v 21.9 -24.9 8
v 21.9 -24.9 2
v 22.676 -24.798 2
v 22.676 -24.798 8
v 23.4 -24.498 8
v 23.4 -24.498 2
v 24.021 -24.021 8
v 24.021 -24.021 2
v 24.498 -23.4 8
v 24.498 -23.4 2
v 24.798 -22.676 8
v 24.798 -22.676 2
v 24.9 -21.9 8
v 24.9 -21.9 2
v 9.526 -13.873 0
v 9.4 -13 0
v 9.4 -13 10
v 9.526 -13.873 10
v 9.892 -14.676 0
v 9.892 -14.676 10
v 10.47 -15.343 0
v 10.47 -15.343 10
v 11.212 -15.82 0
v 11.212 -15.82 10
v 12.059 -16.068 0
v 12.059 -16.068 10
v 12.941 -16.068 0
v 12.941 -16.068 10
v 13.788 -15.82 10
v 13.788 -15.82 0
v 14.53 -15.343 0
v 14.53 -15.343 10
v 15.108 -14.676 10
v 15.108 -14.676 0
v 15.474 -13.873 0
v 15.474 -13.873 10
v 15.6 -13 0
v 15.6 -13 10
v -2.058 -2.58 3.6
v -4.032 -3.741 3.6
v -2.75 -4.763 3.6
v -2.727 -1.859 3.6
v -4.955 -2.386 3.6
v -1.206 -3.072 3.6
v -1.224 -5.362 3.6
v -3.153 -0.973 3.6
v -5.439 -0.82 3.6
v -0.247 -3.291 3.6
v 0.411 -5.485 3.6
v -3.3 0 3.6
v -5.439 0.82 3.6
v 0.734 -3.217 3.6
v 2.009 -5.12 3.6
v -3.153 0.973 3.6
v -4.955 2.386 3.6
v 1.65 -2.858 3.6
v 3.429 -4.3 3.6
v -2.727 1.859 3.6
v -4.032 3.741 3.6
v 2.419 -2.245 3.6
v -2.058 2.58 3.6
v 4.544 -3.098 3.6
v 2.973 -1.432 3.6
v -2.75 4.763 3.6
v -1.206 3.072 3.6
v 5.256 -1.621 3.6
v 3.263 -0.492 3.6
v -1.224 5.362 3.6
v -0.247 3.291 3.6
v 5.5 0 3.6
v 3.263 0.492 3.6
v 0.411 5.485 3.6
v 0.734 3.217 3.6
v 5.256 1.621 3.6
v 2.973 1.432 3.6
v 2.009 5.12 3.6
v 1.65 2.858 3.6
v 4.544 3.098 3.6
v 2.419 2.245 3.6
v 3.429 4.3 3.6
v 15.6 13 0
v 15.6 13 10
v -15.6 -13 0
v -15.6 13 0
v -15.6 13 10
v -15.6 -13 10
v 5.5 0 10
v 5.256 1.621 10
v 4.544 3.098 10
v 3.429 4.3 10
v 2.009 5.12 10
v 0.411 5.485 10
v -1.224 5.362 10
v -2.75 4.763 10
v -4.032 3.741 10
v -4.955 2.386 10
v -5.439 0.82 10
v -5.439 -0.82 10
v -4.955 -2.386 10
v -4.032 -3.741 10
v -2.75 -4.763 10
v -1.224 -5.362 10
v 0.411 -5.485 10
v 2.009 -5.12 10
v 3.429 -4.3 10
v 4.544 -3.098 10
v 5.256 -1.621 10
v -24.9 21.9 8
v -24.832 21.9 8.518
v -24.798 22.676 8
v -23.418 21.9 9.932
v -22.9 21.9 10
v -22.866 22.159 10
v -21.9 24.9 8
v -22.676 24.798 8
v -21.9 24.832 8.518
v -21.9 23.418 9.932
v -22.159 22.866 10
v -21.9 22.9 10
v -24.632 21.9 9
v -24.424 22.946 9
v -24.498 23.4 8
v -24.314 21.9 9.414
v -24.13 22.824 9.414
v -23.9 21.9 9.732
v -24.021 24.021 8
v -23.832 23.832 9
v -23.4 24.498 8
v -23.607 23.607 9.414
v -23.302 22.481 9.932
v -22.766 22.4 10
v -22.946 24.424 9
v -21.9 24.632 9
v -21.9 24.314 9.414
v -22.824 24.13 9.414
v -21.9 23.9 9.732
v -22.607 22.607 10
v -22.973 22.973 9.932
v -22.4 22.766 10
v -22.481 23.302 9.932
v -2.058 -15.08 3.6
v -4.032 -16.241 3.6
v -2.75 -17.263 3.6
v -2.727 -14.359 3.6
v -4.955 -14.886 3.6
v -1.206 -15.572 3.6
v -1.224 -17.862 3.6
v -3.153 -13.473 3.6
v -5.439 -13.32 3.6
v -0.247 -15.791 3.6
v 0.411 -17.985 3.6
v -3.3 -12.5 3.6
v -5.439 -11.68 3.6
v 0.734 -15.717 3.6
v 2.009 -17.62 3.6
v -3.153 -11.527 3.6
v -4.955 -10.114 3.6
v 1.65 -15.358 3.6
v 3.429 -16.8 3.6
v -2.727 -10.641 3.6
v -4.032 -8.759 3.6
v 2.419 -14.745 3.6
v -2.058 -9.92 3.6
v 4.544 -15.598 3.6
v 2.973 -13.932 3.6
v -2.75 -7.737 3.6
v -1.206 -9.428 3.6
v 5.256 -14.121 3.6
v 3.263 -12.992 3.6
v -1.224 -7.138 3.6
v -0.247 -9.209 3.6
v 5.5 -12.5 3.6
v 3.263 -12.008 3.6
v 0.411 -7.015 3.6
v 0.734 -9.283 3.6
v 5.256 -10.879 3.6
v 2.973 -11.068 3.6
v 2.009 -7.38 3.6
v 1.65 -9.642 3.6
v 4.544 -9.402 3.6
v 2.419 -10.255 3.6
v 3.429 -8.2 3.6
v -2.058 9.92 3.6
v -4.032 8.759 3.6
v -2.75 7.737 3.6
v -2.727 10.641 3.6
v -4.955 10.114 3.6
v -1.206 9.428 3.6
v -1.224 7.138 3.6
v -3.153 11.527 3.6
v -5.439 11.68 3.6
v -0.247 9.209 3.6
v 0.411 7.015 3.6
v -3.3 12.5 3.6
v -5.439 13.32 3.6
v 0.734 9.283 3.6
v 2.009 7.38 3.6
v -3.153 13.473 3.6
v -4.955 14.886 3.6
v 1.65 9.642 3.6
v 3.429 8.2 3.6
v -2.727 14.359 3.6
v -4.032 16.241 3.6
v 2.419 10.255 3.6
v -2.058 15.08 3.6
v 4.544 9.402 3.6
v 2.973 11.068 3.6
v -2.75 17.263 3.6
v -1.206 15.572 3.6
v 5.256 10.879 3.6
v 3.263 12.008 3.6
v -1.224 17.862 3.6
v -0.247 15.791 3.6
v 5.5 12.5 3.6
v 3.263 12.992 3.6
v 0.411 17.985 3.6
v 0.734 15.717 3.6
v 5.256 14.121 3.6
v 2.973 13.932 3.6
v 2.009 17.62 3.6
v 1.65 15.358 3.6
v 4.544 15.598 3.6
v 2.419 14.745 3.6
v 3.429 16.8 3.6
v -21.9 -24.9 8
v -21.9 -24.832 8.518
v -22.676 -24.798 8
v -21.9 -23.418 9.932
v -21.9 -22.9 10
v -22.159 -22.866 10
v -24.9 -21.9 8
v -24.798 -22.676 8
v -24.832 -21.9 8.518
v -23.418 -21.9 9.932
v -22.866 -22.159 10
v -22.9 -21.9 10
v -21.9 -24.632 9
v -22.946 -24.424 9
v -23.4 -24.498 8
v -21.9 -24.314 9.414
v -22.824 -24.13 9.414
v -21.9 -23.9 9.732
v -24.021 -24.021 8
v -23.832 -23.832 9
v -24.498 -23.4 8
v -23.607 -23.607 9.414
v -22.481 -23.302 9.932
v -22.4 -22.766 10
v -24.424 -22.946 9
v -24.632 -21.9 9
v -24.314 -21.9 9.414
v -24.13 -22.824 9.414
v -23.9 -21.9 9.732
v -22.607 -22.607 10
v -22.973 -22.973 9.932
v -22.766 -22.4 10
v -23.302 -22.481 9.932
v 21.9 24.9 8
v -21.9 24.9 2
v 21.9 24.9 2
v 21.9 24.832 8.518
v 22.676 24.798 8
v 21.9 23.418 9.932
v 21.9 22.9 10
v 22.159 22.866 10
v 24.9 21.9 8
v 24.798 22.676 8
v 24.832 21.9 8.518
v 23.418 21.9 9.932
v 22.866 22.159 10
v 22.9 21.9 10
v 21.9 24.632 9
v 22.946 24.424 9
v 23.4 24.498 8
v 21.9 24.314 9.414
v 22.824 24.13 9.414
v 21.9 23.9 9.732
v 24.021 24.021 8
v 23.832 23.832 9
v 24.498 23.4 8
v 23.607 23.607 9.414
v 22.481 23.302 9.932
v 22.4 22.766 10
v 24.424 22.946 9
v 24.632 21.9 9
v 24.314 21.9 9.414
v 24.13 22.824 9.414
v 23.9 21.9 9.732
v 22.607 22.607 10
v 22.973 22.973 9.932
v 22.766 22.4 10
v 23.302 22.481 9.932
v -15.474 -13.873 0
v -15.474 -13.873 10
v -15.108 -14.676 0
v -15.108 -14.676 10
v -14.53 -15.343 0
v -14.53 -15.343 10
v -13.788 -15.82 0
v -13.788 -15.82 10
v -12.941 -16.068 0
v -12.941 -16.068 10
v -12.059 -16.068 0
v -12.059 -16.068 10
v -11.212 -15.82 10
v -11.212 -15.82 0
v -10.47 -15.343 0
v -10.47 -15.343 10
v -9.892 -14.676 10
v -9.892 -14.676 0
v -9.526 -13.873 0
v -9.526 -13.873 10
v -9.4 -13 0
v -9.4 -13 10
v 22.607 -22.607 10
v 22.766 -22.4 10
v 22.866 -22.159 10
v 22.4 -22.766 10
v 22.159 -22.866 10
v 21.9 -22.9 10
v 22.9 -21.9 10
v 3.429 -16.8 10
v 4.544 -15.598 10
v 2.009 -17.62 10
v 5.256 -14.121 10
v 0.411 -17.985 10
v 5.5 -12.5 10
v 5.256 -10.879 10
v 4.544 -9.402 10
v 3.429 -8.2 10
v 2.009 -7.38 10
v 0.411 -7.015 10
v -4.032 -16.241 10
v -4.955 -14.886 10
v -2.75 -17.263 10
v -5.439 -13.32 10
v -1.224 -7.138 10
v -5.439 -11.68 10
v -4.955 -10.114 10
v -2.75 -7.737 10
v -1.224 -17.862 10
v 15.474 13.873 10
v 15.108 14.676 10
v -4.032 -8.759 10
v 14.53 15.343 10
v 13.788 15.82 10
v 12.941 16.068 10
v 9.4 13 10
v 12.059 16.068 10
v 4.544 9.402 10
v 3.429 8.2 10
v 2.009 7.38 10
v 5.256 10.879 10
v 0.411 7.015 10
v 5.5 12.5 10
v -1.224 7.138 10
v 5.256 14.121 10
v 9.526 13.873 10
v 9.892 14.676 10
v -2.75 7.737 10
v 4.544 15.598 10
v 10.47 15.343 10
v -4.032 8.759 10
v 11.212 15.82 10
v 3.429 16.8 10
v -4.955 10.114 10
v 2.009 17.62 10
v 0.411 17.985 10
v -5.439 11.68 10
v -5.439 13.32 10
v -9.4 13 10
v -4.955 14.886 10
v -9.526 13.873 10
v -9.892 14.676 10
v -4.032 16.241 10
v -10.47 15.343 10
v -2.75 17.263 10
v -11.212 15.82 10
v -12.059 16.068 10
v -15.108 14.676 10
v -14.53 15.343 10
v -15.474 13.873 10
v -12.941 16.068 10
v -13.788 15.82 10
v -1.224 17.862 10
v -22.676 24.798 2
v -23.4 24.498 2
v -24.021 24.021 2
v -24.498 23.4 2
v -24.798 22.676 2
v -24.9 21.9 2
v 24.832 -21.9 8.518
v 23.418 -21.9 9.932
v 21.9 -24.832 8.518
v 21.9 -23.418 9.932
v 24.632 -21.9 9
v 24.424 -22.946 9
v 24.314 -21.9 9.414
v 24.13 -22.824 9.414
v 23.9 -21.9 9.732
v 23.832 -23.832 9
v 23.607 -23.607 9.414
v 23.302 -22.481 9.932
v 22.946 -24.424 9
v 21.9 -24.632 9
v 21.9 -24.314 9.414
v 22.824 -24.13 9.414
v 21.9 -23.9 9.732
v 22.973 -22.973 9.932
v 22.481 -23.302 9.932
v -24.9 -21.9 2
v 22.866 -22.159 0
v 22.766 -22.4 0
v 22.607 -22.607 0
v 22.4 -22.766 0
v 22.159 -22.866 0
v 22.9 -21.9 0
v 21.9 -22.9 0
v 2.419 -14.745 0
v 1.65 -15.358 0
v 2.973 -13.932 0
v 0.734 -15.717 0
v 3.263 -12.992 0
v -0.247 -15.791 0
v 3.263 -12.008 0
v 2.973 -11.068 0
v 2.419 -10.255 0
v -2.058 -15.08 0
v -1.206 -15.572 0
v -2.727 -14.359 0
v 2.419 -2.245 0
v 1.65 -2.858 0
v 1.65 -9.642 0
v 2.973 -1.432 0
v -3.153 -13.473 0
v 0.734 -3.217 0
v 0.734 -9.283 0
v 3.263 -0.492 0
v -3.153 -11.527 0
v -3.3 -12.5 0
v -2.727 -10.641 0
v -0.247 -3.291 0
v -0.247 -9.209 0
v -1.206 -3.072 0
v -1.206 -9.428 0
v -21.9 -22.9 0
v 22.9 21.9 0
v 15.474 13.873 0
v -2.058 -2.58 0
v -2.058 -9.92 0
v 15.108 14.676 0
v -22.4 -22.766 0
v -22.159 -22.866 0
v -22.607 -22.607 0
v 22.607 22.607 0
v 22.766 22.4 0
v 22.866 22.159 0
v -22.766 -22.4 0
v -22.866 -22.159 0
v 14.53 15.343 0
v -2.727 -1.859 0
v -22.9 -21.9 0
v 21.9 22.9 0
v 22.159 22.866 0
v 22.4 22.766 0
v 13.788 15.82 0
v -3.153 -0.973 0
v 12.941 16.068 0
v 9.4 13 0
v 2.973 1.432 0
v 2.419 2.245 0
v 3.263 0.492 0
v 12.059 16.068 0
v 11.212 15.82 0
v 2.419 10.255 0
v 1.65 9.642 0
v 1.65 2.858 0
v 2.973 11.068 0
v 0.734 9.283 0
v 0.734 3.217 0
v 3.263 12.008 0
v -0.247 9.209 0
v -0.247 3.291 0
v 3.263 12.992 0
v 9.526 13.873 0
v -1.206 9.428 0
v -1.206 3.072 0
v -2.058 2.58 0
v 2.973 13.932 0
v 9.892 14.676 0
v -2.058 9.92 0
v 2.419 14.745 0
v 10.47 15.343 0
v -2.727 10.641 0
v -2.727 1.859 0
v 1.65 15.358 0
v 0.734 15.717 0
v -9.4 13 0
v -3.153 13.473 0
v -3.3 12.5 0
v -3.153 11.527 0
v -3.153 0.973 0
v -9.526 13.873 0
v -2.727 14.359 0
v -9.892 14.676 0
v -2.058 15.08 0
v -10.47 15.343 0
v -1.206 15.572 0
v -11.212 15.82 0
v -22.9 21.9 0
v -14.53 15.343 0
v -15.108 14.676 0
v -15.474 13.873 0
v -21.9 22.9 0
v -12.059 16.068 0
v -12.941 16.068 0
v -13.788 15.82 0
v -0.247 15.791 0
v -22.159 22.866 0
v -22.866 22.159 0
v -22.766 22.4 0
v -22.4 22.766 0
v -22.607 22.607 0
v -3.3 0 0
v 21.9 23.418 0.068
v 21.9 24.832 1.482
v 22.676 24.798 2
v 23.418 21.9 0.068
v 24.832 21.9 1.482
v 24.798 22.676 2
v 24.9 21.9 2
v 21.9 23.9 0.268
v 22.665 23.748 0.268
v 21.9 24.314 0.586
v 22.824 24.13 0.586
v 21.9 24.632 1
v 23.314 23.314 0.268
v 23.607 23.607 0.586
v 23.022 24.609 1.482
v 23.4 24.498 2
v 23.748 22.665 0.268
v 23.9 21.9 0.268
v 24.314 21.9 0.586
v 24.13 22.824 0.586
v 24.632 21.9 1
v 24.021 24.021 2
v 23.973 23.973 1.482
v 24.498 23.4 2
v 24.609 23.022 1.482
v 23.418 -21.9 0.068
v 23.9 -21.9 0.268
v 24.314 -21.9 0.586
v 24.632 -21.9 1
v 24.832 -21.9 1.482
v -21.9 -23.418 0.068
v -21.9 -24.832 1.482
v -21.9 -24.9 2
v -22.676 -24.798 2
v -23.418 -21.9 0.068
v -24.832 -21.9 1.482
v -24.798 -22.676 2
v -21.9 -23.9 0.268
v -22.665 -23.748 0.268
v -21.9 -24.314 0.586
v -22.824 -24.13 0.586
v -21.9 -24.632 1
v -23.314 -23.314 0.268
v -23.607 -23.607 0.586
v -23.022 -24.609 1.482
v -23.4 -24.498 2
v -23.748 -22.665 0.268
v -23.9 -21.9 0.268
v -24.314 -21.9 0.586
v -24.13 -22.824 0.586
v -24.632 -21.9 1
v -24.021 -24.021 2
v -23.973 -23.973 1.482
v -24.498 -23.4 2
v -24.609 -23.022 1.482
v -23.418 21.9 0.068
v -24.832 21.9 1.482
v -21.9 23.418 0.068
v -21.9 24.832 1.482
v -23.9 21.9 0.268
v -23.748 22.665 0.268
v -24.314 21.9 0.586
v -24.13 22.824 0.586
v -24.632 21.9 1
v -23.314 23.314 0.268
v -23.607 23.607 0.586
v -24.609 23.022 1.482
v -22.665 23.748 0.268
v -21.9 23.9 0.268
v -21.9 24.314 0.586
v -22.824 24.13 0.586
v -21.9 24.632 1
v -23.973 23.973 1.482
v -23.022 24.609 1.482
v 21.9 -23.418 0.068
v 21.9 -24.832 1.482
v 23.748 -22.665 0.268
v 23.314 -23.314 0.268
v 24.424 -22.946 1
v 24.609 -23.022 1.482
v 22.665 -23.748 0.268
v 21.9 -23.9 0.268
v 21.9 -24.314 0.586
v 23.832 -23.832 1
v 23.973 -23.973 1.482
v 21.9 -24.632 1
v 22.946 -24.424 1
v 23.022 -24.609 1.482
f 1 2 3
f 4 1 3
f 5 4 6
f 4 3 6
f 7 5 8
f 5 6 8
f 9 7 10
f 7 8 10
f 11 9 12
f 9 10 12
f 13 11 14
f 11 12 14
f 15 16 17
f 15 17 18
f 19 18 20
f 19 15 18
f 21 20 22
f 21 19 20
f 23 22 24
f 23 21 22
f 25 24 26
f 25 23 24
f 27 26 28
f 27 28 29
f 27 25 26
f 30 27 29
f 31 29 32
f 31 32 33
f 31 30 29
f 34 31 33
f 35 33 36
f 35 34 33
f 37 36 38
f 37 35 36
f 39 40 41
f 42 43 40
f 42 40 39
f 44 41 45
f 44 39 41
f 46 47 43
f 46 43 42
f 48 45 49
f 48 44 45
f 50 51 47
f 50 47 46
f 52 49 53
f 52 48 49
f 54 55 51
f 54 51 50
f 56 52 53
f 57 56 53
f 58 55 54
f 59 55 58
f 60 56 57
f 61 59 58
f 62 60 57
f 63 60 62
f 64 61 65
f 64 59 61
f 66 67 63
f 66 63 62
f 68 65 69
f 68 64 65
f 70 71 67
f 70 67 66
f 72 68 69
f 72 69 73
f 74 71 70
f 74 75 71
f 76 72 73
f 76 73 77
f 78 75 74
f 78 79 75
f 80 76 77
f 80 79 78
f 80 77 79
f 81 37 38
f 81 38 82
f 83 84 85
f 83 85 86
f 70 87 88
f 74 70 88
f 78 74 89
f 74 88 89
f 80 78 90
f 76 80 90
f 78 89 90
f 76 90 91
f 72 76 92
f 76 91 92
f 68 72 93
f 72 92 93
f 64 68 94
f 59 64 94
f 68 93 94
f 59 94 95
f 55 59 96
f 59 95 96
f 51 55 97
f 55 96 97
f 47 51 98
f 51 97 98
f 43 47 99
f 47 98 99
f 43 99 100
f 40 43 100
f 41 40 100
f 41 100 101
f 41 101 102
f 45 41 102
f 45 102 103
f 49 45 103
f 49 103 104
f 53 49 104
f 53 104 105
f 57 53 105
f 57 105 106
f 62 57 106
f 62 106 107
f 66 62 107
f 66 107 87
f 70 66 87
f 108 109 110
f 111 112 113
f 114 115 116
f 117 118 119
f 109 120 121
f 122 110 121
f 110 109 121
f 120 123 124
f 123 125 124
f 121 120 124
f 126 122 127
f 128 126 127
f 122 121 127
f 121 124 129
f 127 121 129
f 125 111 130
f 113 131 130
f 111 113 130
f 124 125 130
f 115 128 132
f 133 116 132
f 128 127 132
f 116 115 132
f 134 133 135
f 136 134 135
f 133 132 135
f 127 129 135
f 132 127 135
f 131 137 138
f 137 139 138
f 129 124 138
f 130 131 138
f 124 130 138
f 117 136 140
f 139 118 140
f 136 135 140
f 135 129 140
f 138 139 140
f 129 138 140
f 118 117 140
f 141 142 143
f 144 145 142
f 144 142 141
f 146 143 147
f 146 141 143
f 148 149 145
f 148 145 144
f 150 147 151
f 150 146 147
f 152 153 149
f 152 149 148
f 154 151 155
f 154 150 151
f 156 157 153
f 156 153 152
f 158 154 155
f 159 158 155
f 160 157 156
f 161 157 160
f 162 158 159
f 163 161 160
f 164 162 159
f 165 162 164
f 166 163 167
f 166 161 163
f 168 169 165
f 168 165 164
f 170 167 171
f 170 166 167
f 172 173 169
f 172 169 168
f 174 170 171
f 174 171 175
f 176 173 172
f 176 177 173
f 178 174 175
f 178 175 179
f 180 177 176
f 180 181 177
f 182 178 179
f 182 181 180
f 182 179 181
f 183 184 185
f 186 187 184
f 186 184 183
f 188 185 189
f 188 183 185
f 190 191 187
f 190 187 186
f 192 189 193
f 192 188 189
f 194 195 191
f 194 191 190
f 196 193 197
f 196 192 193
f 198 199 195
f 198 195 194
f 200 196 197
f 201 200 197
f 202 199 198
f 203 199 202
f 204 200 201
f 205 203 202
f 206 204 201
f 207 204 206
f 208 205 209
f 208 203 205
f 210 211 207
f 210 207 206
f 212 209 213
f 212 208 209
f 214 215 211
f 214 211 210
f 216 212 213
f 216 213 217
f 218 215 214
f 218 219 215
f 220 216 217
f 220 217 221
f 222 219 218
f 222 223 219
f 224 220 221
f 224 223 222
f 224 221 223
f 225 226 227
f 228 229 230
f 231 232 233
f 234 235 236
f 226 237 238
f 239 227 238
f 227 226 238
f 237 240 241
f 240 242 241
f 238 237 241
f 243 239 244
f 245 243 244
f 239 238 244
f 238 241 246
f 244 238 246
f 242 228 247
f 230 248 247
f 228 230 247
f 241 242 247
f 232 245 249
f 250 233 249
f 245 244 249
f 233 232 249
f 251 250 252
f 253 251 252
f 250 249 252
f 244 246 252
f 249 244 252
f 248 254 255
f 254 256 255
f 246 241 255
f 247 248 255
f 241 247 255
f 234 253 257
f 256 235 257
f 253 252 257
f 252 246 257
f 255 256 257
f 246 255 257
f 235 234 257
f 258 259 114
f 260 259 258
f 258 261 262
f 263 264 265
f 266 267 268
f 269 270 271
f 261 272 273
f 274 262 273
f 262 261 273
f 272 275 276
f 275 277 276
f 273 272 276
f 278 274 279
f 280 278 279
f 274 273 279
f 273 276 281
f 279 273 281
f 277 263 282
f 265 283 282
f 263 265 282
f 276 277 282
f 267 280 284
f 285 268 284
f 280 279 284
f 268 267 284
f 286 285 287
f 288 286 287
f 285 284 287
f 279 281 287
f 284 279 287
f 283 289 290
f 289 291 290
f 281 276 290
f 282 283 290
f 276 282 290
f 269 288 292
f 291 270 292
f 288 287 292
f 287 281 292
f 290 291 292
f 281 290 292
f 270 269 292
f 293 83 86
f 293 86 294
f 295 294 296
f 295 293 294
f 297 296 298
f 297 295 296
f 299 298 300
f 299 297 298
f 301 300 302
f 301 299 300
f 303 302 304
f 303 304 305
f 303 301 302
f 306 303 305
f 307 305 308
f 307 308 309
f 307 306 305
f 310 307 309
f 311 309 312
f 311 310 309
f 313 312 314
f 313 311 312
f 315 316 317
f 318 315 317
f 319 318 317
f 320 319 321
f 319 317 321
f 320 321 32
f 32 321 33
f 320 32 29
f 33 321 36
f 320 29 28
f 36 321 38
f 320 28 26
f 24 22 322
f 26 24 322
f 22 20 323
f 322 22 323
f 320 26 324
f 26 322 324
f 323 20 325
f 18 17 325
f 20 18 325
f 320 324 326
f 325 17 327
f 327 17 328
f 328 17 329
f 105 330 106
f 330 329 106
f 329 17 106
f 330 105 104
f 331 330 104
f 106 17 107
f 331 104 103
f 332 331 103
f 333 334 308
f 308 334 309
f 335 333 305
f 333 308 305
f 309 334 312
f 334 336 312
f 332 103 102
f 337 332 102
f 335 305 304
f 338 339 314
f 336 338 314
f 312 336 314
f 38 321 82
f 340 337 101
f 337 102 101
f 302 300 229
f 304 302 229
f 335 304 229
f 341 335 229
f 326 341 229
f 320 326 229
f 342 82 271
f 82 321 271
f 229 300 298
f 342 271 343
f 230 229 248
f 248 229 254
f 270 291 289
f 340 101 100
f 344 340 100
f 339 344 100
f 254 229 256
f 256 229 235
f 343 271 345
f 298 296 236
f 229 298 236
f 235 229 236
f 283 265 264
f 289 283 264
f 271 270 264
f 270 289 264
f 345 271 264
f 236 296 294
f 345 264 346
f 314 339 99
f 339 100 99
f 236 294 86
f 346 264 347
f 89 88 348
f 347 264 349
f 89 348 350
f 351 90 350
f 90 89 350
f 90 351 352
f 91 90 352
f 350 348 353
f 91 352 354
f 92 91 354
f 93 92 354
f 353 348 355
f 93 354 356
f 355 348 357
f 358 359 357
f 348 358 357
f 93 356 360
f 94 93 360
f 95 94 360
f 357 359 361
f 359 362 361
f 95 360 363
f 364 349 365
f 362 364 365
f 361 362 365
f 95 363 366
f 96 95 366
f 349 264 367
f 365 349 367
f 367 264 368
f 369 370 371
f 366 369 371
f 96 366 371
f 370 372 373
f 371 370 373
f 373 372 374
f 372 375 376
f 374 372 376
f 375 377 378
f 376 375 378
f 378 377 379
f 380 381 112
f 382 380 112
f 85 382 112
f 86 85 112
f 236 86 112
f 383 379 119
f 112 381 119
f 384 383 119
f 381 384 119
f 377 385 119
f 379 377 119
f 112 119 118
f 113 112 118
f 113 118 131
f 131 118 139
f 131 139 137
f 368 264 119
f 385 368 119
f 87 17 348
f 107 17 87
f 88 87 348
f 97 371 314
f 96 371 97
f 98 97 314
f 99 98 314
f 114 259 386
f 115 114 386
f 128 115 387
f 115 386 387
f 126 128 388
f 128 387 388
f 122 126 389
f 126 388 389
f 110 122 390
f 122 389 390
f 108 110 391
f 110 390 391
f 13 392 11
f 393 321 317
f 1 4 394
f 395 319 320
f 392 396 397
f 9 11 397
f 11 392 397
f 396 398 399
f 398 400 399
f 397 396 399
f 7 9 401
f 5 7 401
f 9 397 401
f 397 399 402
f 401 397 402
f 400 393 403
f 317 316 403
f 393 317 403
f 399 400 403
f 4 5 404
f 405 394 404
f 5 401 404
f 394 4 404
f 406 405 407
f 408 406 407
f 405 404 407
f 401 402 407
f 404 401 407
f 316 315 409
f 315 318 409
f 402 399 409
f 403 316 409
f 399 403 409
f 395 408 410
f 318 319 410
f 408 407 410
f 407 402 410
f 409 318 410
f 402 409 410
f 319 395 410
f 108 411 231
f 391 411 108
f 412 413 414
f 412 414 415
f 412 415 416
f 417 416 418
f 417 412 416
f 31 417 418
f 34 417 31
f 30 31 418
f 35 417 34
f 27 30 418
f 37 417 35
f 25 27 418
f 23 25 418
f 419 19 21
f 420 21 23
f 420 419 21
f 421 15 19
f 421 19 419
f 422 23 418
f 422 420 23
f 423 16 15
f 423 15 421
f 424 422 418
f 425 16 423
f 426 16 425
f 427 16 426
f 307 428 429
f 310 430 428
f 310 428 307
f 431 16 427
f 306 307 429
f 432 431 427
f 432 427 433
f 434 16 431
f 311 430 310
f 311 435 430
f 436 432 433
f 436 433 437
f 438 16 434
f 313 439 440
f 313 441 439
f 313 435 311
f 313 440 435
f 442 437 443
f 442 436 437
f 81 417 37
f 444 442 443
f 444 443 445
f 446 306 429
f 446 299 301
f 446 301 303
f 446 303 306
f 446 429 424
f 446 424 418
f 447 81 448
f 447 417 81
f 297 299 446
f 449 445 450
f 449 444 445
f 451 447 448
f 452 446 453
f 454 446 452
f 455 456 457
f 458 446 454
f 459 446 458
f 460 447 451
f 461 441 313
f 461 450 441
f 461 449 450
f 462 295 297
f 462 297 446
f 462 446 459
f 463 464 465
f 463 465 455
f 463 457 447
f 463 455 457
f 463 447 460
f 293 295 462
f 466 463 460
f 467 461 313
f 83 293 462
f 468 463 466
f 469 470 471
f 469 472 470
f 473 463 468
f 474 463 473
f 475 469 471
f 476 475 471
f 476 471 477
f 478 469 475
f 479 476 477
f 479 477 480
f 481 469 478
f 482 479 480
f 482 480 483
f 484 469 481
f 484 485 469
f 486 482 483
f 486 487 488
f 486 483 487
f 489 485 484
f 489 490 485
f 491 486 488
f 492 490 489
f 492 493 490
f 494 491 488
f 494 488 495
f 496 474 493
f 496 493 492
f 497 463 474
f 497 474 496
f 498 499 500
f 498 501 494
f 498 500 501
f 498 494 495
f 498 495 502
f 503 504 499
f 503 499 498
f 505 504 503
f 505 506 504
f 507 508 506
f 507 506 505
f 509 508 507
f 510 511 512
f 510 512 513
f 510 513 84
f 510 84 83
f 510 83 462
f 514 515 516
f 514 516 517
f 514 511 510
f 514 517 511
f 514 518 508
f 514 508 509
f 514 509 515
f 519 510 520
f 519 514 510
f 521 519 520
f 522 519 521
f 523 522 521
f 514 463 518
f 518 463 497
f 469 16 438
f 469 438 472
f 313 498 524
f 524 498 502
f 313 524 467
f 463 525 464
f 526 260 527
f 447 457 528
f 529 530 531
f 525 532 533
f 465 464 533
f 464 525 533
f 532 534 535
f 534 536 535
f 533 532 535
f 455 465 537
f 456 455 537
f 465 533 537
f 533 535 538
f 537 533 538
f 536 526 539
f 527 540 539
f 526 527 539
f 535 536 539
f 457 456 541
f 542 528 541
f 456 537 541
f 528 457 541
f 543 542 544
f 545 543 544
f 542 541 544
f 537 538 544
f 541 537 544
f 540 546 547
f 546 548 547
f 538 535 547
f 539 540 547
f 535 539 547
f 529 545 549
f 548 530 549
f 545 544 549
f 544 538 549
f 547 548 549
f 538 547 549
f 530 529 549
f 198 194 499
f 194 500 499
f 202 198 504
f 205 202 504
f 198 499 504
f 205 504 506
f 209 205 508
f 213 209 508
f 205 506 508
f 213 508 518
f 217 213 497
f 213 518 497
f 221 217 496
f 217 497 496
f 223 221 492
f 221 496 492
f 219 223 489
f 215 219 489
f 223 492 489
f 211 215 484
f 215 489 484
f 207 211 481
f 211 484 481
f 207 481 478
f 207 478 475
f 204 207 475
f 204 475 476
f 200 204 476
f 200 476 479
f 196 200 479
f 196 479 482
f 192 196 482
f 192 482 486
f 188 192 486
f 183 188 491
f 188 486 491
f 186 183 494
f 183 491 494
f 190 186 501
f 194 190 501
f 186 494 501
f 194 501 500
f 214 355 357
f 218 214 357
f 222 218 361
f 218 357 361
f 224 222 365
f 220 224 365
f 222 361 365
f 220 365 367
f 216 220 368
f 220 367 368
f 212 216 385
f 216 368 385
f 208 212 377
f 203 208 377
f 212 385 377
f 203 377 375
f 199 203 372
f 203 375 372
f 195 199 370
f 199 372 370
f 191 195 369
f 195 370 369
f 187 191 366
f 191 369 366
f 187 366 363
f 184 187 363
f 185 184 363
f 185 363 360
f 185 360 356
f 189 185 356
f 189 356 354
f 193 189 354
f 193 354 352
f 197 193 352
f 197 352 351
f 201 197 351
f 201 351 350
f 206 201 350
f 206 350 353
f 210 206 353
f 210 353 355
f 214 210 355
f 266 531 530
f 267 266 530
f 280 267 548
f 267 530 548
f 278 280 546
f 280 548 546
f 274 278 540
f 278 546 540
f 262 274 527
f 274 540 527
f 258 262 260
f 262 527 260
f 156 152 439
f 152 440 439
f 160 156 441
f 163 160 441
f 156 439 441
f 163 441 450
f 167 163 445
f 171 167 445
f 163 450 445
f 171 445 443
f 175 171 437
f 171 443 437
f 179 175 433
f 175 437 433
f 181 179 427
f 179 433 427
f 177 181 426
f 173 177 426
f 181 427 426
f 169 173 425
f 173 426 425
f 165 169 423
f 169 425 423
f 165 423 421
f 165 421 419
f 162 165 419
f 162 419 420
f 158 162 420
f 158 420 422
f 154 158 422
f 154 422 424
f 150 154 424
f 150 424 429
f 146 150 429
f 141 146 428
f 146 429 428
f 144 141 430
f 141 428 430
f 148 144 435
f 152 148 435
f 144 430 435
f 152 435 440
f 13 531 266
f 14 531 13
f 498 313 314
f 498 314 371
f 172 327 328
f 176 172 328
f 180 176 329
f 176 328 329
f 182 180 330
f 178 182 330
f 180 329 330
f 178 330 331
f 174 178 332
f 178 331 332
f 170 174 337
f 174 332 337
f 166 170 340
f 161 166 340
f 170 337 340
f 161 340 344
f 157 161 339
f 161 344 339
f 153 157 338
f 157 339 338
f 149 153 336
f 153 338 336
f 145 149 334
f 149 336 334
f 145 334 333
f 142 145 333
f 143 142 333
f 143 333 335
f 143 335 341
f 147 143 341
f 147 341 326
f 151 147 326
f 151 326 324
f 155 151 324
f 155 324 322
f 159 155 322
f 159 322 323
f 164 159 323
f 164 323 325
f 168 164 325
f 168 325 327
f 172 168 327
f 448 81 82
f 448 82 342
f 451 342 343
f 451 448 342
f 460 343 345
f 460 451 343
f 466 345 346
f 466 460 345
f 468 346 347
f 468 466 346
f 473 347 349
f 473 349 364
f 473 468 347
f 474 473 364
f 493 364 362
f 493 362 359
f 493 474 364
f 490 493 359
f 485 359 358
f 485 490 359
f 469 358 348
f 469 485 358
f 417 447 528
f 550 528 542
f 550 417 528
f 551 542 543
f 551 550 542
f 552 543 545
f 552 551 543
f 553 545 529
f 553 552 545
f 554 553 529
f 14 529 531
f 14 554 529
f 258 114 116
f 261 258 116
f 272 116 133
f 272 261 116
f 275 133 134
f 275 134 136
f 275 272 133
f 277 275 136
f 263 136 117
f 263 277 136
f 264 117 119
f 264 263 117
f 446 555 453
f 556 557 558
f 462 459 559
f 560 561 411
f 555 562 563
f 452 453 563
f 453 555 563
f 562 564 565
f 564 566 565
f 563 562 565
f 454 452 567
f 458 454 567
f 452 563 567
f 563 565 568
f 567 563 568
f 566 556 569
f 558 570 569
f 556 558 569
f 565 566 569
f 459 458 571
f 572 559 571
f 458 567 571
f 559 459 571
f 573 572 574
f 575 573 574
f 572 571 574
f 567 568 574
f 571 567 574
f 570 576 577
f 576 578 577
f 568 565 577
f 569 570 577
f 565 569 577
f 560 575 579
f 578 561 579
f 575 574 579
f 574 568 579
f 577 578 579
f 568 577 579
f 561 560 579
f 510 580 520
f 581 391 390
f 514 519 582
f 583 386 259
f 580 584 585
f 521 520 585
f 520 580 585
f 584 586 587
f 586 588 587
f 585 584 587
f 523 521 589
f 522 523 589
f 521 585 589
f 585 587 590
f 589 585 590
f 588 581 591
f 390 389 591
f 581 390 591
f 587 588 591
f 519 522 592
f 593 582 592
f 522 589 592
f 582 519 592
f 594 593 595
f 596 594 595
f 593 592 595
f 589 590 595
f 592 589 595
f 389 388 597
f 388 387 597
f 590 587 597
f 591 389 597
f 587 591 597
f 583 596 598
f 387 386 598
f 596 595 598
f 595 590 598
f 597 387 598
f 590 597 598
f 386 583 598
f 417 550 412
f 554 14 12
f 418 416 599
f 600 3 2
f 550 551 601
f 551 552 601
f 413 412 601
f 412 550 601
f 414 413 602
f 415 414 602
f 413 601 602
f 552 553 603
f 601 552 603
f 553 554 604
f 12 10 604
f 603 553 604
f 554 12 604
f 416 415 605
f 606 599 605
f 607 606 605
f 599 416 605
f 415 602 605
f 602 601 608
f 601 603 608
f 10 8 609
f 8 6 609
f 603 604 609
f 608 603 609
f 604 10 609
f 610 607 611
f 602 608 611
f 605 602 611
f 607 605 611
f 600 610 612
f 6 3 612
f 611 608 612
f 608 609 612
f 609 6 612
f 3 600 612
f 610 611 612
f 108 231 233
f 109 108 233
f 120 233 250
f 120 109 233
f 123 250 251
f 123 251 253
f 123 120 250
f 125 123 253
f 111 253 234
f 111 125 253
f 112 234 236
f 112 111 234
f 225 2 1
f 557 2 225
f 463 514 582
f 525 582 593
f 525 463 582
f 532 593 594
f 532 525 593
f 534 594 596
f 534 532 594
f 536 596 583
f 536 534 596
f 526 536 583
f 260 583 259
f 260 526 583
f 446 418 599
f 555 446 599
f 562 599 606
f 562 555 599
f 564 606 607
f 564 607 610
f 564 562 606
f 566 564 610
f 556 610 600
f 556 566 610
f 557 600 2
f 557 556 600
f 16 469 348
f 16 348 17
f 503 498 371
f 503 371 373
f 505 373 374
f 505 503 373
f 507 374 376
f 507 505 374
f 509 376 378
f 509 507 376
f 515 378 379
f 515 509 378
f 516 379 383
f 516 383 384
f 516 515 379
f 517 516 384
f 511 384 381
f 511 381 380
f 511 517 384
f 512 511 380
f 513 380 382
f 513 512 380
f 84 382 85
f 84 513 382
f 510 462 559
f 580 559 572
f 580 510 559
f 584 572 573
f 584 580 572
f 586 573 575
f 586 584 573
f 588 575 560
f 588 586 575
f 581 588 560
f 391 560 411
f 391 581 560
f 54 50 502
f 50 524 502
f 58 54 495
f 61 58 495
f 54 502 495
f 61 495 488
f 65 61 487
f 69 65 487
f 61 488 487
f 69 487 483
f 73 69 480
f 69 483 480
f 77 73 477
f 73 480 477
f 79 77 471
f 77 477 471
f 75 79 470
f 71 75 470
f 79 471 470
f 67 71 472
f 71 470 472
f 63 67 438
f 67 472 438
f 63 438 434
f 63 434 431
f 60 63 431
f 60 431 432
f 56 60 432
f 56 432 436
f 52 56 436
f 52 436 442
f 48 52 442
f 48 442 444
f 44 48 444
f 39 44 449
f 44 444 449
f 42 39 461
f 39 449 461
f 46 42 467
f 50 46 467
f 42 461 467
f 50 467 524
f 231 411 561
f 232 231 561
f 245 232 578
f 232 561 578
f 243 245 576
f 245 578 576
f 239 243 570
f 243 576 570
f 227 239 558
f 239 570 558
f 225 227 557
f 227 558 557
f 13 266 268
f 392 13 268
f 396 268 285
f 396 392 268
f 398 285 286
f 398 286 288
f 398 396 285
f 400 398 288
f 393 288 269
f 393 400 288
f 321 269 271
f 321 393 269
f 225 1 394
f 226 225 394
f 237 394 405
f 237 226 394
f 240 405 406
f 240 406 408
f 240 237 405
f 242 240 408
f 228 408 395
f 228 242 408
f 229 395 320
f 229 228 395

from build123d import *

# Parameters (mm, degrees)
PAD_DEPTH        = 10
FILLET_R         = 2
FILLET001_R      = 2
HOLE_D           = 6.6
HOLE_DEPTH       = 25
HOLE_CBORE_D     = 11
HOLE_CBORE_DEPTH = 6.4


with BuildPart() as part:
    # Sketch → Pad (new body)
    with BuildSketch(Plane.XY):
        with BuildLine():
            Line((-21.9, 24.9), (21.9, 24.9))
            ThreePointArc((24.9, 21.9), (24.02132, 24.02132), (21.9, 24.9))
            Line((24.9, 21.9), (24.9, -21.9))
            ThreePointArc((21.9, -24.9), (24.02132, -24.02132), (24.9, -21.9))
            Line((21.9, -24.9), (-21.9, -24.9))
            ThreePointArc((-24.9, -21.9), (-24.02132, -24.02132), (-21.9, -24.9))
            Line((-24.9, -21.9), (-24.9, 21.9))
            ThreePointArc((-21.9, 24.9), (-24.02132, 24.02132), (-24.9, 21.9))
        make_face()
        with BuildLine():
            ThreePointArc((-9.4, 13), (-12.5, 16.1), (-15.6, 13))
            Line((-15.6, 13), (-15.6, -13))
            ThreePointArc((-15.6, -13), (-12.5, -16.1), (-9.4, -13))
            Line((-9.4, -13), (-9.4, 13))
        make_face(mode=Mode.SUBTRACT)
        with BuildLine():
            ThreePointArc((15.6, 13), (12.5, 16.1), (9.4, 13))
            Line((9.4, 13), (9.4, -13))
            ThreePointArc((9.4, -13), (12.5, -16.1), (15.6, -13))
            Line((15.6, -13), (15.6, 13))
        make_face(mode=Mode.SUBTRACT)
    extrude(amount=PAD_DEPTH)

    # Fillet
    fillet_edges = [part.edges().sort_by_distance(p)[0] for p in [
        (0, -24.9, 10),
    ]]
    fillet(fillet_edges, radius=FILLET_R)

    # Fillet001
    fillet001_edges = [part.edges().sort_by_distance(p)[0] for p in [
        (0, -24.9, 0),
    ]]
    fillet(fillet001_edges, radius=FILLET001_R)

    # Hole
    with Locations(Plane.XY.offset(10)):
        with Locations((0, 0), (0, 12.5), (0, -12.5)):
            CounterBoreHole(HOLE_D / 2, HOLE_CBORE_D / 2, HOLE_CBORE_DEPTH, depth=HOLE_DEPTH)


solid = part.part
